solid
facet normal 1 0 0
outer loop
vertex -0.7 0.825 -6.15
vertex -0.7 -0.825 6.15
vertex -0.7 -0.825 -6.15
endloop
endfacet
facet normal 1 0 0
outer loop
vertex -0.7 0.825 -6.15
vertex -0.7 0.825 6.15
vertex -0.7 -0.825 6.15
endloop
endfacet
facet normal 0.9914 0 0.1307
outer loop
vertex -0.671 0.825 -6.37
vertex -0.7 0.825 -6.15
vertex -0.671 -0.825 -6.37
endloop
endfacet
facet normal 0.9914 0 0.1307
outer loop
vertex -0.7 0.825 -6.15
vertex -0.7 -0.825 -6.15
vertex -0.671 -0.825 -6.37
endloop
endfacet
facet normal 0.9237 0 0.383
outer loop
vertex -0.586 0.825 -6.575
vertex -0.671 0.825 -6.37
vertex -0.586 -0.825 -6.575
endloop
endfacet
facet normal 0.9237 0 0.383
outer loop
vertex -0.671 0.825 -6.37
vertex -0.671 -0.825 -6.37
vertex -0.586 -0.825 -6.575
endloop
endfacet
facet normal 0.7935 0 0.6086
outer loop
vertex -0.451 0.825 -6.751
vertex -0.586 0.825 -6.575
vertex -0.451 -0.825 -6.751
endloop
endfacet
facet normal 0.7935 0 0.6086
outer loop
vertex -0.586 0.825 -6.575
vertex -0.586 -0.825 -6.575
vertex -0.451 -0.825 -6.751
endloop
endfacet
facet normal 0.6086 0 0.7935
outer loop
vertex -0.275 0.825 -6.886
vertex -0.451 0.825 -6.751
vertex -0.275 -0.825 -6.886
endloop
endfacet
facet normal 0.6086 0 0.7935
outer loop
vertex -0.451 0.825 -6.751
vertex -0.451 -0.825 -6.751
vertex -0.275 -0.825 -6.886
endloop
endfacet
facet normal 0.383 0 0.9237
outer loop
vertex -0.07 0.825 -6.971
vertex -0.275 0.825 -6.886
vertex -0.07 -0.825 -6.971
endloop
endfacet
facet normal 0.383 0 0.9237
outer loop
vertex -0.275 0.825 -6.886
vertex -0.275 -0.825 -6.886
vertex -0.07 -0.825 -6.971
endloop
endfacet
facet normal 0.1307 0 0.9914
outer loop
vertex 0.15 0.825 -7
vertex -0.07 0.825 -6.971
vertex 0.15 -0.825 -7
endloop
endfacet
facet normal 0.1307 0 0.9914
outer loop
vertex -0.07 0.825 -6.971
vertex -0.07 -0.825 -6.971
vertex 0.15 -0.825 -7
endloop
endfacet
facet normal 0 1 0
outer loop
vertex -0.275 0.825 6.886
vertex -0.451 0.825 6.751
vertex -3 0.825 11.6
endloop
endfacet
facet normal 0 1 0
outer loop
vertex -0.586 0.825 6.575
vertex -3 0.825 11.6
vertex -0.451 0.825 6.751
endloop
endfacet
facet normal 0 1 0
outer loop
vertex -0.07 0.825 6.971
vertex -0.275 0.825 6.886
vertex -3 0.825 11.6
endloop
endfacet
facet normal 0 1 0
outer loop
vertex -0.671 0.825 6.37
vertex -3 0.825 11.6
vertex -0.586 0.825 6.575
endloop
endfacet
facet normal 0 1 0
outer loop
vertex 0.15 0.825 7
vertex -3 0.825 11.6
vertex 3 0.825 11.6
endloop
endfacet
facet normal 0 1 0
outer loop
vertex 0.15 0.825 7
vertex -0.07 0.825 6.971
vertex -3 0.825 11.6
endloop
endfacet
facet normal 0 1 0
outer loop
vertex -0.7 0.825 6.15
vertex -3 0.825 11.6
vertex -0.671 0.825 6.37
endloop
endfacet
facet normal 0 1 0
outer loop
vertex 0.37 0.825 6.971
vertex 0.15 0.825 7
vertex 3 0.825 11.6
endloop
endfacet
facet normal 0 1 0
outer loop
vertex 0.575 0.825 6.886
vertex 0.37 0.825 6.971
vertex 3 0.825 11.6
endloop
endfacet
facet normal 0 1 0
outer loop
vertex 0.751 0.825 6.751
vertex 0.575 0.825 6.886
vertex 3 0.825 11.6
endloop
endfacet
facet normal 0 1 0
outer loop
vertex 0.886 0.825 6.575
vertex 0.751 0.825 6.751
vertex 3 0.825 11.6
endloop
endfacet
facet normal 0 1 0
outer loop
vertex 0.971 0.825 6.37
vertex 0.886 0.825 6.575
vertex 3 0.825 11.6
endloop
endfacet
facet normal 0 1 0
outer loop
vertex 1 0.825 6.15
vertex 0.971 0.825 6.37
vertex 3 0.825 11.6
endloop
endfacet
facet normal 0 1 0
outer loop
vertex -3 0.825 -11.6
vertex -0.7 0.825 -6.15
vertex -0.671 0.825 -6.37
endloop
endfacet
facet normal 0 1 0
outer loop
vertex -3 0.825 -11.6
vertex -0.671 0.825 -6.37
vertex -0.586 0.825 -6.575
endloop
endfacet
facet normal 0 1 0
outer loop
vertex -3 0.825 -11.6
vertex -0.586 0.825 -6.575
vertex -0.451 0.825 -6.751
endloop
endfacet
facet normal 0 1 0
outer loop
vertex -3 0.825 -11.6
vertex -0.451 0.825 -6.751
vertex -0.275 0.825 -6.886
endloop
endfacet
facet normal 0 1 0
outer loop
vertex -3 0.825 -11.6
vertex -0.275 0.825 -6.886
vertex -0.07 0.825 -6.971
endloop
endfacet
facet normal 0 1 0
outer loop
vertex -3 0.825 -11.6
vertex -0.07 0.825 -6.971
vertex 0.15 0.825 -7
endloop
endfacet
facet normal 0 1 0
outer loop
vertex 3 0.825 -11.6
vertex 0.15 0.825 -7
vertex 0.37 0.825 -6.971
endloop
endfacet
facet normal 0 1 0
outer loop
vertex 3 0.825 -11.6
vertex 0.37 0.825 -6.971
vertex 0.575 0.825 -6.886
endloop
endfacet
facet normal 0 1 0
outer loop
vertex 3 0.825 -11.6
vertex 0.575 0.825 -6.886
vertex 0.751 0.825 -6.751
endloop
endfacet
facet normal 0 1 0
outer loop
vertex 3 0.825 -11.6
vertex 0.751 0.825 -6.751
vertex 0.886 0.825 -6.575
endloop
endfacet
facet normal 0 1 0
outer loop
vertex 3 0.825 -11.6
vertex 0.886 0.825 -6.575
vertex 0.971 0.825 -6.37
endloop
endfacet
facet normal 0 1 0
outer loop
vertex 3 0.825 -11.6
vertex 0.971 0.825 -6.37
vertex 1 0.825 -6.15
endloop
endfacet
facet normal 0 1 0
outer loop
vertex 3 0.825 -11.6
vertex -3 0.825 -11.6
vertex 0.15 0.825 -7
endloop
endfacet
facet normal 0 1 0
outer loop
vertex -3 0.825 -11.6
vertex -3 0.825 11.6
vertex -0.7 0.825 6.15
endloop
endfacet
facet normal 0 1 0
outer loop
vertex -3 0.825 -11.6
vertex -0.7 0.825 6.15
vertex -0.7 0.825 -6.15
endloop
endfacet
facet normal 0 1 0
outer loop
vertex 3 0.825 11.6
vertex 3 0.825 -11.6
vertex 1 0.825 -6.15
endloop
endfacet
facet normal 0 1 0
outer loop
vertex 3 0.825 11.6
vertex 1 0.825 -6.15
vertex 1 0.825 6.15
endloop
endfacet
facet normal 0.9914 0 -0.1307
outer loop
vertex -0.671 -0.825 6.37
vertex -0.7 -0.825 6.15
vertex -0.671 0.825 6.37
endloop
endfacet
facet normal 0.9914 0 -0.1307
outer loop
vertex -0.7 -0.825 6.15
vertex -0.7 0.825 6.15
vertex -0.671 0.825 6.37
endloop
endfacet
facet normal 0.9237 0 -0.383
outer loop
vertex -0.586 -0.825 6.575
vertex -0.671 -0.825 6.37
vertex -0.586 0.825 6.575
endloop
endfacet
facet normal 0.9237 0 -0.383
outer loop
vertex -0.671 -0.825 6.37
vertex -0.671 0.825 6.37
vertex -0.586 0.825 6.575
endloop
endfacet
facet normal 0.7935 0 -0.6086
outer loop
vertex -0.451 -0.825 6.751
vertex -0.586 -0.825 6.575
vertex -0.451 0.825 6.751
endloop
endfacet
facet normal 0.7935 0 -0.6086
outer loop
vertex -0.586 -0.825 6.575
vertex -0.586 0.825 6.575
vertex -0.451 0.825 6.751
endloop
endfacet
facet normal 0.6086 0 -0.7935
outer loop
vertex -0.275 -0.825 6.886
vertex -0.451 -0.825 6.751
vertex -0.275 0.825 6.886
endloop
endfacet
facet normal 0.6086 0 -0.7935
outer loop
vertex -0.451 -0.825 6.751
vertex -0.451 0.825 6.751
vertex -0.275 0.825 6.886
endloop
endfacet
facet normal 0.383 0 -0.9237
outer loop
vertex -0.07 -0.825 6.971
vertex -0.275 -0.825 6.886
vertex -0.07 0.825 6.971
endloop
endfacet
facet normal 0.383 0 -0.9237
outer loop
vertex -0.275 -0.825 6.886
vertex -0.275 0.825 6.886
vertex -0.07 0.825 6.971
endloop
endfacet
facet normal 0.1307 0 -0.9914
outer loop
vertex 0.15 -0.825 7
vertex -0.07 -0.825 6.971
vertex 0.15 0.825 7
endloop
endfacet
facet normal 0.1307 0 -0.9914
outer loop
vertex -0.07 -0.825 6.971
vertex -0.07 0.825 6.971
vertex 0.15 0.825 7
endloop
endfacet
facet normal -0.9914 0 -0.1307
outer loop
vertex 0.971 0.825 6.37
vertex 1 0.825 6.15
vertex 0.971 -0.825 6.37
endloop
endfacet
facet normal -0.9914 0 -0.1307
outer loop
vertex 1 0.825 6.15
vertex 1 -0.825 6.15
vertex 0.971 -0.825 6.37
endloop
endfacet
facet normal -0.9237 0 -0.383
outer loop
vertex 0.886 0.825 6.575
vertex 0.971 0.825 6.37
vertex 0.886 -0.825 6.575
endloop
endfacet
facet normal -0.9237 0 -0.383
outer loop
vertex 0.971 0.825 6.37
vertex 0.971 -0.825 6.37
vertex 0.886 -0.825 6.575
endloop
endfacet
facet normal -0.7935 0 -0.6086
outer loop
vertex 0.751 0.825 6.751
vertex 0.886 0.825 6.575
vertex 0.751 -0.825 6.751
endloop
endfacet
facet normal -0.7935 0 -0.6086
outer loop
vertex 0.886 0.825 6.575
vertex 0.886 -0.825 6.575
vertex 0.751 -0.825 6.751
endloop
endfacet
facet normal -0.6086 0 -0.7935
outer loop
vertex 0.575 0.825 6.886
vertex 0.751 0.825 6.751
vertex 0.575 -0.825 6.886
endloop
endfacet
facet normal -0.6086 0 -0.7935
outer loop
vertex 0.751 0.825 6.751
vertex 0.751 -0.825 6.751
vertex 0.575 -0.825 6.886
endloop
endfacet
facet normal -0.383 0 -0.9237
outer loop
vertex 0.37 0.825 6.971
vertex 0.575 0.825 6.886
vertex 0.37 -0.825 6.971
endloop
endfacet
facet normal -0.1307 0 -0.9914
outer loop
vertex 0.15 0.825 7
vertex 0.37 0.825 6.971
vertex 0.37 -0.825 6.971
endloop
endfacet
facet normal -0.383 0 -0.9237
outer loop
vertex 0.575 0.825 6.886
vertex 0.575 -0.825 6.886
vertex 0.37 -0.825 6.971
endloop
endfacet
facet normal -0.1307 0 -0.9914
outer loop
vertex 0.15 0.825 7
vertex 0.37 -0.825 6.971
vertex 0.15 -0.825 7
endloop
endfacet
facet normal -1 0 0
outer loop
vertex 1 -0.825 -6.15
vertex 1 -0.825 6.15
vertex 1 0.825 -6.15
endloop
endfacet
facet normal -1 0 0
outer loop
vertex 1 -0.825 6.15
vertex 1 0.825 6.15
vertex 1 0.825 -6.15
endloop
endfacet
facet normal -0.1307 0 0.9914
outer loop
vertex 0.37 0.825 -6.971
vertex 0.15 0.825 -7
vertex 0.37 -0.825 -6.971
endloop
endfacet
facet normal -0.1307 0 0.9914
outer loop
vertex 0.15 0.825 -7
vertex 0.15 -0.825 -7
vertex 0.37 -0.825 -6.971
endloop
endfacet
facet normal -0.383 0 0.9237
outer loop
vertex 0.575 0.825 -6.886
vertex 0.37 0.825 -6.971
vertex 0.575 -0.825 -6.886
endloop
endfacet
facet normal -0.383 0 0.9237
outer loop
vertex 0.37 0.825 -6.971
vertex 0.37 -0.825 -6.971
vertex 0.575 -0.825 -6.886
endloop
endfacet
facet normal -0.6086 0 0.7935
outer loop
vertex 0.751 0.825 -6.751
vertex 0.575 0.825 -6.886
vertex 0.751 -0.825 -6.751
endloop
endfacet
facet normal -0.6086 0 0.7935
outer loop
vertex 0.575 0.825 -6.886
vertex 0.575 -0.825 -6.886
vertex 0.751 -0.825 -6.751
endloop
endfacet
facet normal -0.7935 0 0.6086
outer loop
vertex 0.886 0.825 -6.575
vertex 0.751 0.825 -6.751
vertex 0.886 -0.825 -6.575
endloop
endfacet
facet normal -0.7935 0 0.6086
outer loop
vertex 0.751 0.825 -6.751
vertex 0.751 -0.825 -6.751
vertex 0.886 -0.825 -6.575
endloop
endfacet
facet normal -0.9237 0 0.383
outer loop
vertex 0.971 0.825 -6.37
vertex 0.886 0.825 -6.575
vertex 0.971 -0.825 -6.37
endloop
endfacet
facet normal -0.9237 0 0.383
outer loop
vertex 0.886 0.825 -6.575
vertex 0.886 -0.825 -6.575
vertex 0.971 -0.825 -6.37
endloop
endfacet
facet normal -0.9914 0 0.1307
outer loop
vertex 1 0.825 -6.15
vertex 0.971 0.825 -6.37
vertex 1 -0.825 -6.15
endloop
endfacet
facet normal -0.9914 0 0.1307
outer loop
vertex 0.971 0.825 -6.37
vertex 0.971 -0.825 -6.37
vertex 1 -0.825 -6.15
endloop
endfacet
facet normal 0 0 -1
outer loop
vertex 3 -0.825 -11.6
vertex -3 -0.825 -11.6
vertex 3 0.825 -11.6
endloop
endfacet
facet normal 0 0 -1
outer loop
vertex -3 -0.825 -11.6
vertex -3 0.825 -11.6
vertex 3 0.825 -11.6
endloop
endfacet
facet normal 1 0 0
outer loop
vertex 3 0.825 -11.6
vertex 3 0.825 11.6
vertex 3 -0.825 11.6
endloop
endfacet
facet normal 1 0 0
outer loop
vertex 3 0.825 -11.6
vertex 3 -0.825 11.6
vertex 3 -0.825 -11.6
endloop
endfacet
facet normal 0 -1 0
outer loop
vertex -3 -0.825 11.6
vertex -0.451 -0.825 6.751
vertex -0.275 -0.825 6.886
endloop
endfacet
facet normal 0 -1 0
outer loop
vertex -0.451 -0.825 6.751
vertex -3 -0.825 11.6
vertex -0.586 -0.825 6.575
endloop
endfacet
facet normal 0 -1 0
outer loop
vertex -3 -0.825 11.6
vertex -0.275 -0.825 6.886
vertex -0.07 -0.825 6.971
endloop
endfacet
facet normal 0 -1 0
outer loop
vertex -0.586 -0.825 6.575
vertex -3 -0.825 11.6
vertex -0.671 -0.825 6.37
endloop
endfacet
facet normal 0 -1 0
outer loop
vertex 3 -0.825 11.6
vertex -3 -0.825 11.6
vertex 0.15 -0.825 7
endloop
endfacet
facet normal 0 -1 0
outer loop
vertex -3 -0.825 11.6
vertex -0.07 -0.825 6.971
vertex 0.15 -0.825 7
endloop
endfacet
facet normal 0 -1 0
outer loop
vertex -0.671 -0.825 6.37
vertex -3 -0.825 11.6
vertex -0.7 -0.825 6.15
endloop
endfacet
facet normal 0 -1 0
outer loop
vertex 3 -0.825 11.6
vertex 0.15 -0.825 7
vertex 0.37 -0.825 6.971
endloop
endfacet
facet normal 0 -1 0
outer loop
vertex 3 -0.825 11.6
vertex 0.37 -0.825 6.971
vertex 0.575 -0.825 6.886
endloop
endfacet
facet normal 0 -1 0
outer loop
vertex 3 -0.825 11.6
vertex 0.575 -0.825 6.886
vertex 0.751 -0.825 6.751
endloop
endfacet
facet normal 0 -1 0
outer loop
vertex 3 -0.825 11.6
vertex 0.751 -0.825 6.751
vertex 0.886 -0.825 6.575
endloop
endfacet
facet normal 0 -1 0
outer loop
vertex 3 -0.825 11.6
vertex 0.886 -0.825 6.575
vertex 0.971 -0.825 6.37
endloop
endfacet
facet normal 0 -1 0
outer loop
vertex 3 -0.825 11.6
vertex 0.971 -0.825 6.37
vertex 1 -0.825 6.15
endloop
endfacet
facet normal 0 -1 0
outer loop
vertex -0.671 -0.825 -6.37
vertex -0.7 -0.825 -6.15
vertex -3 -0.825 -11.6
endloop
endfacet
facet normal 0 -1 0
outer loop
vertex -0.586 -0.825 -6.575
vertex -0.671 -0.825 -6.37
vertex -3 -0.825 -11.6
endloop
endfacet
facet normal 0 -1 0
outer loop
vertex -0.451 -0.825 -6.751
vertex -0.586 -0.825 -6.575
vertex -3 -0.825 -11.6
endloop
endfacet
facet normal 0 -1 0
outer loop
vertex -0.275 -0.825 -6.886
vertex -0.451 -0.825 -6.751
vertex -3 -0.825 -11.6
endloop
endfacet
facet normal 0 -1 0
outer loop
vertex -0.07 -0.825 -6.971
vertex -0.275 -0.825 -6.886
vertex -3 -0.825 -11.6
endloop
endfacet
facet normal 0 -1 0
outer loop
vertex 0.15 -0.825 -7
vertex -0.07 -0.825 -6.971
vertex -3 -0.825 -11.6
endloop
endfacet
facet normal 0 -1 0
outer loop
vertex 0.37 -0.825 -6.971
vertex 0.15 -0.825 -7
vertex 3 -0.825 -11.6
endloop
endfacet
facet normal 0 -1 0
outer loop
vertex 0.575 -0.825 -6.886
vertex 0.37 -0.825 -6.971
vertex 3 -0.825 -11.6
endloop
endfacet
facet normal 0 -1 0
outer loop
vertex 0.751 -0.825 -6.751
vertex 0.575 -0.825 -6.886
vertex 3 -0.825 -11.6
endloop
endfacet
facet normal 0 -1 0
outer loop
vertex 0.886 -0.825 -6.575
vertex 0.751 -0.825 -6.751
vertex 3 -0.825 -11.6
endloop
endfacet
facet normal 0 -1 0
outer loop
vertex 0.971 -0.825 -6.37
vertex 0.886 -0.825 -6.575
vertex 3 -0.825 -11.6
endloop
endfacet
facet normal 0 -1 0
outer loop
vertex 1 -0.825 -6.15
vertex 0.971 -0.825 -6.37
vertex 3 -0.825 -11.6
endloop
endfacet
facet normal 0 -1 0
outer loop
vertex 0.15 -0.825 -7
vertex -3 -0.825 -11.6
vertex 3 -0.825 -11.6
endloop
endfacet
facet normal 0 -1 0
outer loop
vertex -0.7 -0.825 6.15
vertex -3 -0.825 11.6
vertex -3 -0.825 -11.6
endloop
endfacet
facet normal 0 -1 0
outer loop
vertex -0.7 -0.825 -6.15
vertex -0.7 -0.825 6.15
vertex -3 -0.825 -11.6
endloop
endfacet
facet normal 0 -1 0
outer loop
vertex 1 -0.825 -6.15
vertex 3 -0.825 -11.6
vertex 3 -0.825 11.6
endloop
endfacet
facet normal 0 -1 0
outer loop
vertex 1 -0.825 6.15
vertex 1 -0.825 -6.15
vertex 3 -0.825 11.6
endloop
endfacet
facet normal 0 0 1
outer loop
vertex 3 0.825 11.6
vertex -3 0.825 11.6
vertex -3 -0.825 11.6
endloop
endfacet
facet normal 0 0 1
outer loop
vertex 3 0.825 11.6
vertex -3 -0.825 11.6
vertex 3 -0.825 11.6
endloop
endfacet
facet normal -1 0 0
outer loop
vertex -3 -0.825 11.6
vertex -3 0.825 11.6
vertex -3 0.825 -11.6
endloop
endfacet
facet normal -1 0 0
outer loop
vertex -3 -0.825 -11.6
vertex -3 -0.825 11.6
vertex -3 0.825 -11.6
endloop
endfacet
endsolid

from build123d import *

# Parameters (mm, degrees)
SKIZZE1_W                       = 6
SKIZZE1_H                       = 23.2
SKIZZE1_W_2                     = 1.7
SKIZZE1_H_2                     = 14
AUFSATZ_LINEAR_AUSTRAGEN1_DEPTH = 0.825
VERRUNDUNG2_R                   = 0.85


with BuildPart() as part:
    # Skizze1 → Aufsatz-Linear austragen1 (new, symmetric)
    with BuildSketch(Plane(origin=(0, 0, 0), x_dir=(1, 0, 0), z_dir=(0, 1, 0))):
        Rectangle(SKIZZE1_W, SKIZZE1_H)
        with Locations((0.15, 0)):
            Rectangle(SKIZZE1_W_2, SKIZZE1_H_2, mode=Mode.SUBTRACT)
    extrude(amount=AUFSATZ_LINEAR_AUSTRAGEN1_DEPTH, both=True)

    # Verrundung2
    verrundung2_edges = [part.edges().sort_by_distance(p)[0] for p in [
        (-0.7, 0, 7),
        (1, 0, 7),
        (1, 0, -7),
        (-0.7, 0, -7),
    ]]
    fillet(verrundung2_edges, radius=VERRUNDUNG2_R - 0.0001)  # a hair under: the kernel refuses the full size


solid = part.part
